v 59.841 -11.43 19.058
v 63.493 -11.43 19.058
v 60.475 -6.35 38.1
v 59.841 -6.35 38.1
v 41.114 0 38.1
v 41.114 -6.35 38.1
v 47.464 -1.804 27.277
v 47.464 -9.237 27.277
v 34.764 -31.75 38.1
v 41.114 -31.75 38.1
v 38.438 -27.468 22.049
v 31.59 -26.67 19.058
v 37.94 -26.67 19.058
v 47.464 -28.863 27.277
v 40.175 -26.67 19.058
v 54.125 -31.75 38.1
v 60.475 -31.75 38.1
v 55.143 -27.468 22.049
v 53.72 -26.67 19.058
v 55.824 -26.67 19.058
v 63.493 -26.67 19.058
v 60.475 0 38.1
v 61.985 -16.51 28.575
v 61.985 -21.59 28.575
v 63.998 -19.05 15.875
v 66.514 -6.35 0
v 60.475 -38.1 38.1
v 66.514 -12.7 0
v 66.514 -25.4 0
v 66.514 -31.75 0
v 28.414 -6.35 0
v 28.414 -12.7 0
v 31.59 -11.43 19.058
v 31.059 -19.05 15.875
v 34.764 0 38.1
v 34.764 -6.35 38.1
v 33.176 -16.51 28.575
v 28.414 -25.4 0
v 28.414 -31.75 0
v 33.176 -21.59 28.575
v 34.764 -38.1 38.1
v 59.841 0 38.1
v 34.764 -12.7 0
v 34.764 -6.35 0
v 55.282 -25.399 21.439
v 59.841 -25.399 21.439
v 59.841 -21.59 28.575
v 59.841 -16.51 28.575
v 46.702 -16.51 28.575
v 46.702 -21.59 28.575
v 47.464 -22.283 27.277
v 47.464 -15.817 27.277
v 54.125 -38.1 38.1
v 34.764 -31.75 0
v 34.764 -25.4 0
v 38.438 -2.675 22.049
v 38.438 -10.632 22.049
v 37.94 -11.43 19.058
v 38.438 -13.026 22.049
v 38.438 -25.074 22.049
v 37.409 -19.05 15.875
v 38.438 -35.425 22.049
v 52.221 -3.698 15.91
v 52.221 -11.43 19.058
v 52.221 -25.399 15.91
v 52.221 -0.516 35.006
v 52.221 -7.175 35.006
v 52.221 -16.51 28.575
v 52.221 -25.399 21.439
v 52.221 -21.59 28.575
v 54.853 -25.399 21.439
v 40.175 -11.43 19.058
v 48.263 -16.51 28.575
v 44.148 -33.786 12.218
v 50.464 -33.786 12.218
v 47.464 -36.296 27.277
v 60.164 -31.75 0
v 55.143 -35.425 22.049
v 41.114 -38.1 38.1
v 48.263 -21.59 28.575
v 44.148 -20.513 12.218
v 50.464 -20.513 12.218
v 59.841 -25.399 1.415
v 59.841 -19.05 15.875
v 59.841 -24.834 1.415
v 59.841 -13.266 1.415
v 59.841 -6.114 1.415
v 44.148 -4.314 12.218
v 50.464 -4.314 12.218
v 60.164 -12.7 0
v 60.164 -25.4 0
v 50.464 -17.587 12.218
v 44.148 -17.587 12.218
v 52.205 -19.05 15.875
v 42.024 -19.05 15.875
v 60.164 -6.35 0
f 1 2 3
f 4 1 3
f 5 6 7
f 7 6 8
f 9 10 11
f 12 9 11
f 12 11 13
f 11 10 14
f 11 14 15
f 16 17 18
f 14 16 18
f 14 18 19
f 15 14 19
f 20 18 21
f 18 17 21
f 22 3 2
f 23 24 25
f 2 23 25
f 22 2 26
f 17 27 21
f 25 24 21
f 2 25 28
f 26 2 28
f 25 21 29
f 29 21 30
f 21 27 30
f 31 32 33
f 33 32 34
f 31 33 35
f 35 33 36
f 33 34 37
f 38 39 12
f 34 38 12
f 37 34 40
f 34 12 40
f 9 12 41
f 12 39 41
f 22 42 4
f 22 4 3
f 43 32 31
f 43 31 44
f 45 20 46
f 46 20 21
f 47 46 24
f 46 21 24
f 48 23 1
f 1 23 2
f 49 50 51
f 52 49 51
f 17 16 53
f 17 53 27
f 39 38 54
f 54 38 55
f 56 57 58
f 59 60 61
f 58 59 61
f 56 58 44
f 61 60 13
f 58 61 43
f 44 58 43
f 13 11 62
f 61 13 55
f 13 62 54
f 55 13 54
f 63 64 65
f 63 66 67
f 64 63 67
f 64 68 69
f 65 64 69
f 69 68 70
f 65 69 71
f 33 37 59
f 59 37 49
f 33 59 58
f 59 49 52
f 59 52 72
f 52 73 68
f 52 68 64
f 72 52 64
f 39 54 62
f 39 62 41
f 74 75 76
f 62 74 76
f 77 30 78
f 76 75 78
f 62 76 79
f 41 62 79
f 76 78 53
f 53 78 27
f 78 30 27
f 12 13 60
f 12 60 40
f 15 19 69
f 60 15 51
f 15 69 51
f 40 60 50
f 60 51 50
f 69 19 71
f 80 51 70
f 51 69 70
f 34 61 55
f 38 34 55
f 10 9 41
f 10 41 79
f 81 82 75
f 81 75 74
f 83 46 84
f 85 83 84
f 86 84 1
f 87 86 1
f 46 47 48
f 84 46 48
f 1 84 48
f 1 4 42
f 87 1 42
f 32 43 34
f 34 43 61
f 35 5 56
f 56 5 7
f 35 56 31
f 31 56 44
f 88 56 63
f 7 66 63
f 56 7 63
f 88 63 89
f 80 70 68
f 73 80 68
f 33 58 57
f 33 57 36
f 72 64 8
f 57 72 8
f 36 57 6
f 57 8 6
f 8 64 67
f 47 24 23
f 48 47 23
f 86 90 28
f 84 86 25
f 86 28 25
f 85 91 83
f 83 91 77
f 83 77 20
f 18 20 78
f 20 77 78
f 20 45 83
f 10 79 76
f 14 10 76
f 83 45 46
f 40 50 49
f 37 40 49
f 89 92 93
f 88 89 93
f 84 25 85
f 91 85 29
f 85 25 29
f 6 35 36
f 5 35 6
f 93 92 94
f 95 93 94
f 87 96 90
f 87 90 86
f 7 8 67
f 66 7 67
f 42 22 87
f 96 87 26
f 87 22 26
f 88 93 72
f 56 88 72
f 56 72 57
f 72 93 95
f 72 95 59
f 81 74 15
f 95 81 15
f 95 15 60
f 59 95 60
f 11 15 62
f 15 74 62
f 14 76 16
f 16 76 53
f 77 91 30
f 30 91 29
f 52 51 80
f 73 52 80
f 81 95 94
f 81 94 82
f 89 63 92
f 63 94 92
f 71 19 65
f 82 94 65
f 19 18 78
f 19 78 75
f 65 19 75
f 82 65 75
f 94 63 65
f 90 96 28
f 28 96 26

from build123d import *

# Parameters (mm, degrees)
F0_W     = 38.1
F0_H     = 38.1
F1_DEPTH = 38.1
F5_DEPTH = 38.1
F7_DEPTH = 38.1
F9_DEPTH = 38.1


with BuildPart() as f1:
    # F0 (on Front) → F1 (new body)
    with BuildSketch(Plane.XZ):
        with Locations((47.4635573444, 19.05)):
            Rectangle(F0_W, F0_H)
    extrude(amount=F1_DEPTH)

    # F4 (on face) → F5 (cut)
    with BuildSketch(Plane.YZ.offset(66.5135573444)):
        Polygon((-31.75, 0), (-38.1, 38.1), (-38.1, 0), align=None)
        Polygon((-6.35, 38.1), (-31.75, 38.1), (-26.67, 19.0584023679), (-21.59, 28.575), (-16.51, 28.575), (-11.43, 19.0584023679), align=None)
        Polygon((0, 0), (0, 38.1), (-6.35, 0), align=None)
        Polygon((-19.05, 15.875), (-25.4, 0), (-12.7, 0), align=None)
    extrude(amount=-F5_DEPTH, mode=Mode.SUBTRACT)

    # F6 (on offset) → F7 (cut)
    with BuildSketch(Plane.XZ.offset(38.1)):
        Polygon((38.4384175691, 22.0491613483), (34.7635573444, 0), (60.1635573444, 0), (55.1432829689, 22.0491613483), (50.4643332552, 12.2184510259), (44.1477571021, 12.2184510259), align=None)
        Polygon((34.7635573444, 38.1), (28.4135573444, 38.1), (28.4135573444, 0), align=None)
        Polygon((54.1253941298, 38.1), (41.1135573444, 38.1), (47.4635573444, 27.2768866271), align=None)
        Polygon((60.4753941298, 38.1), (66.5135573444, 0), (66.5135573444, 38.1), align=None)
    extrude(amount=-F7_DEPTH, mode=Mode.SUBTRACT)

    # F8 (on offset) → F9 (cut)
    with BuildSketch(Plane.XY.offset(38.1)):
        Polygon((59.8412752151, 0), (52.2212752151, 0), (52.2212752151, -12.7), (52.2212752151, -25.3993560767), (59.8412752151, -25.3993560767), (59.8412752151, -12.6993560767), align=None)
    extrude(amount=-F9_DEPTH, mode=Mode.SUBTRACT)


solid = f1.part
